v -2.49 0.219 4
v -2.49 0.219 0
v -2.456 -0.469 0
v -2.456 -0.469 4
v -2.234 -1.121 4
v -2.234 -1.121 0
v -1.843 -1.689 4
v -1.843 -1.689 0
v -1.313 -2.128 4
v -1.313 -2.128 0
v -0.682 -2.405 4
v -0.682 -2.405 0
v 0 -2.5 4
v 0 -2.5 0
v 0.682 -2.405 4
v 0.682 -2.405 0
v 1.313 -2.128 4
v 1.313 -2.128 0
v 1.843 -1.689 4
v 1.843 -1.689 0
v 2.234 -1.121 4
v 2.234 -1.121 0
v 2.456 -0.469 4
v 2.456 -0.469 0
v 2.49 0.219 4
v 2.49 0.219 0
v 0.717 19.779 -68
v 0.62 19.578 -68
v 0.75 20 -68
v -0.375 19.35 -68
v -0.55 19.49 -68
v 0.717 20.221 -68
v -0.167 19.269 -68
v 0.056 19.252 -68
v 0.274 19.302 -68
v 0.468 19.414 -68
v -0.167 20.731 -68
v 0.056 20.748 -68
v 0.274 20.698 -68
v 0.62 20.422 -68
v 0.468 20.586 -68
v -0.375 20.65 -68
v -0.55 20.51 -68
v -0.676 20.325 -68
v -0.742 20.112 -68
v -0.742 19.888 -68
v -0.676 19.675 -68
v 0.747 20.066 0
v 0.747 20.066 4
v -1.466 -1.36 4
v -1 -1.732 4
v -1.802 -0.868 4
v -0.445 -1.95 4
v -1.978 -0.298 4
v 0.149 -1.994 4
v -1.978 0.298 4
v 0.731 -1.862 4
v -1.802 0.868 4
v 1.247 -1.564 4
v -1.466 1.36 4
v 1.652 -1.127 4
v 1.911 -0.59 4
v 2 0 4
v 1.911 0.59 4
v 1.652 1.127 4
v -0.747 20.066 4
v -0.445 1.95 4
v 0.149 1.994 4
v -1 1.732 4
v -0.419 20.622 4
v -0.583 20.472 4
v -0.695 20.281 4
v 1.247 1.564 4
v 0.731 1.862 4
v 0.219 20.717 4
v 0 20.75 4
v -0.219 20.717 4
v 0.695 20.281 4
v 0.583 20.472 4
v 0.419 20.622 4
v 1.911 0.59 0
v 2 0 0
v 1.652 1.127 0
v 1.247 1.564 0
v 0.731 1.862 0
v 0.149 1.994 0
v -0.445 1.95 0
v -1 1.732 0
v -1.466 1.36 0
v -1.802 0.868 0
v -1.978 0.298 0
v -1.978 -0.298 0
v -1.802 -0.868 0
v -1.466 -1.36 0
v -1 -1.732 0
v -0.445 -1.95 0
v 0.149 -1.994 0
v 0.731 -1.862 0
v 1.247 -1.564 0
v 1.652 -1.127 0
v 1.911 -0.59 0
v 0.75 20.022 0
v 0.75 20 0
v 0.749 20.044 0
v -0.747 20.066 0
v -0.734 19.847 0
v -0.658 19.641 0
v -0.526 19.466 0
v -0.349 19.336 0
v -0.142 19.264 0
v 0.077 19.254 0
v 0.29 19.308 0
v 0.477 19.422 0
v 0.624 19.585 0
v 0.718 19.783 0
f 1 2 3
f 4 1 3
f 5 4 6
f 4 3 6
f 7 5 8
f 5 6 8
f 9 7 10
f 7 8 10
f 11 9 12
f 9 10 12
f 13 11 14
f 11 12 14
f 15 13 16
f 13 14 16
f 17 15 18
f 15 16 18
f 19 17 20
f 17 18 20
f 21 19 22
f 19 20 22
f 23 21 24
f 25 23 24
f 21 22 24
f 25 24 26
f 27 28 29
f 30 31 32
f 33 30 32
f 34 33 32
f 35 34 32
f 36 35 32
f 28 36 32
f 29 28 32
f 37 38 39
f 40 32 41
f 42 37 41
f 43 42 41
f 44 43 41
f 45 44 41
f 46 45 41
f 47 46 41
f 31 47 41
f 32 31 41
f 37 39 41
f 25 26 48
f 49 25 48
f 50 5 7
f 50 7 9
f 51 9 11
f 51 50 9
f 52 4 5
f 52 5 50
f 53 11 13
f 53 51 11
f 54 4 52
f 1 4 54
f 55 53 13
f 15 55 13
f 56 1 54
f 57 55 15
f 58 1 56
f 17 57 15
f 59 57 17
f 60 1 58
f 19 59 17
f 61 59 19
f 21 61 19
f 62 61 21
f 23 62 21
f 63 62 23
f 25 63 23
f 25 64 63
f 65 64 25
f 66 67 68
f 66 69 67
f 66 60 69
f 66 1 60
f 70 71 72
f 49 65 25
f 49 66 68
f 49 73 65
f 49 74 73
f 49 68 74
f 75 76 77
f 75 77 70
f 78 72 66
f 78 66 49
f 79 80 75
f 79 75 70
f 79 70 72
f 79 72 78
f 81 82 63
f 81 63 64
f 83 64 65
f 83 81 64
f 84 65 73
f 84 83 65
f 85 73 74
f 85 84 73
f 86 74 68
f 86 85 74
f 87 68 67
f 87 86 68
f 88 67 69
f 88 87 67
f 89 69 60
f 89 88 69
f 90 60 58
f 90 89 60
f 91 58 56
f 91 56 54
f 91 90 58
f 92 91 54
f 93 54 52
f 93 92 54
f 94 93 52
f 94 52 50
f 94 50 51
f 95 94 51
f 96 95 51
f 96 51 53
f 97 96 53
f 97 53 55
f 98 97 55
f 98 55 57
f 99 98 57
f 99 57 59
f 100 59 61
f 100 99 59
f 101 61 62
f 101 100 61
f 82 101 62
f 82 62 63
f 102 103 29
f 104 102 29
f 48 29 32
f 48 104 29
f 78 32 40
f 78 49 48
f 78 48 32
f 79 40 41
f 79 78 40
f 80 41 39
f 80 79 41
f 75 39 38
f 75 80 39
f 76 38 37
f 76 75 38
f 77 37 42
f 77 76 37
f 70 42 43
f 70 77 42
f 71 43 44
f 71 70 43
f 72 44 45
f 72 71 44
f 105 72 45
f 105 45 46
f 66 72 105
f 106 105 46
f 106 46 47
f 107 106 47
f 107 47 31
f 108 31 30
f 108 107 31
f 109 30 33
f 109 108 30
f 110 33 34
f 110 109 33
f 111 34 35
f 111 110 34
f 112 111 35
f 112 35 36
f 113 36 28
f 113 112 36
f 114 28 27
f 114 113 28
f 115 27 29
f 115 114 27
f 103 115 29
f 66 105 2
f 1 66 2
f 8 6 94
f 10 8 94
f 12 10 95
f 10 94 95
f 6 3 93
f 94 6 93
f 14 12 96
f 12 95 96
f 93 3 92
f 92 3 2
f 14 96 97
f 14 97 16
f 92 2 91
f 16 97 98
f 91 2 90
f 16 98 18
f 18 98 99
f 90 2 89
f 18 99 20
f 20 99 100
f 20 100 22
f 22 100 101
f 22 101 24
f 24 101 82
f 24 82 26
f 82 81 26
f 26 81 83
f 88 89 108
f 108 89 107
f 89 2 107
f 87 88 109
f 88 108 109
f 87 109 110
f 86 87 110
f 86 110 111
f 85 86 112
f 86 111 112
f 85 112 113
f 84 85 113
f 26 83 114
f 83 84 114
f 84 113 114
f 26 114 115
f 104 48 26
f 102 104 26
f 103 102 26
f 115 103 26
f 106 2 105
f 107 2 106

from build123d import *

# Parameters (mm, degrees)
IZIM1_R                          = 2
Y_KSEKLIK_EKSTR_ZYON1_DEPTH      = 4
Y_KSEKLIK_EKSTR_ZYON2_DEPTH      = 4
Y_KSEKLIK_EKSTR_ZYON2_DEPTH_BACK = 68


with BuildPart() as part:
    # Çizim1 → Yükseklik-Ekstrüzyon1 (new body)
    with BuildSketch(Plane.XY):
        with BuildLine():
            Line((2.490411299, 0.21875), (0.74712339, 20.065625))
            ThreePointArc((0.74712339, 20.065625), (0, 19.25), (-0.74712339, 20.065625))
            Line((-0.74712339, 20.065625), (-2.490411299, 0.21875))
            ThreePointArc((-2.490411299, 0.21875), (0, -2.5), (2.490411299, 0.21875))
        make_face()
        Circle(IZIM1_R, mode=Mode.SUBTRACT)
    extrude(amount=Y_KSEKLIK_EKSTR_ZYON1_DEPTH)

    # Çizim1<3> → Yükseklik-Ekstrüzyon2 (add, two sides: drawn at the far end of the back side and taken through both)
    with BuildSketch(Plane.XY.offset(-Y_KSEKLIK_EKSTR_ZYON2_DEPTH_BACK)):
        with BuildLine():
            ThreePointArc((0.74712339, 20.065625), (0, 20.75), (-0.74712339, 20.065625))
            ThreePointArc((-0.74712339, 20.065625), (-0.032844008, 19.250719498), (0.75, 20))
            ThreePointArc((0.75, 20), (0.749280502, 20.032844008), (0.74712339, 20.065625))
        make_face()
    extrude(amount=Y_KSEKLIK_EKSTR_ZYON2_DEPTH + Y_KSEKLIK_EKSTR_ZYON2_DEPTH_BACK)


solid = part.part
